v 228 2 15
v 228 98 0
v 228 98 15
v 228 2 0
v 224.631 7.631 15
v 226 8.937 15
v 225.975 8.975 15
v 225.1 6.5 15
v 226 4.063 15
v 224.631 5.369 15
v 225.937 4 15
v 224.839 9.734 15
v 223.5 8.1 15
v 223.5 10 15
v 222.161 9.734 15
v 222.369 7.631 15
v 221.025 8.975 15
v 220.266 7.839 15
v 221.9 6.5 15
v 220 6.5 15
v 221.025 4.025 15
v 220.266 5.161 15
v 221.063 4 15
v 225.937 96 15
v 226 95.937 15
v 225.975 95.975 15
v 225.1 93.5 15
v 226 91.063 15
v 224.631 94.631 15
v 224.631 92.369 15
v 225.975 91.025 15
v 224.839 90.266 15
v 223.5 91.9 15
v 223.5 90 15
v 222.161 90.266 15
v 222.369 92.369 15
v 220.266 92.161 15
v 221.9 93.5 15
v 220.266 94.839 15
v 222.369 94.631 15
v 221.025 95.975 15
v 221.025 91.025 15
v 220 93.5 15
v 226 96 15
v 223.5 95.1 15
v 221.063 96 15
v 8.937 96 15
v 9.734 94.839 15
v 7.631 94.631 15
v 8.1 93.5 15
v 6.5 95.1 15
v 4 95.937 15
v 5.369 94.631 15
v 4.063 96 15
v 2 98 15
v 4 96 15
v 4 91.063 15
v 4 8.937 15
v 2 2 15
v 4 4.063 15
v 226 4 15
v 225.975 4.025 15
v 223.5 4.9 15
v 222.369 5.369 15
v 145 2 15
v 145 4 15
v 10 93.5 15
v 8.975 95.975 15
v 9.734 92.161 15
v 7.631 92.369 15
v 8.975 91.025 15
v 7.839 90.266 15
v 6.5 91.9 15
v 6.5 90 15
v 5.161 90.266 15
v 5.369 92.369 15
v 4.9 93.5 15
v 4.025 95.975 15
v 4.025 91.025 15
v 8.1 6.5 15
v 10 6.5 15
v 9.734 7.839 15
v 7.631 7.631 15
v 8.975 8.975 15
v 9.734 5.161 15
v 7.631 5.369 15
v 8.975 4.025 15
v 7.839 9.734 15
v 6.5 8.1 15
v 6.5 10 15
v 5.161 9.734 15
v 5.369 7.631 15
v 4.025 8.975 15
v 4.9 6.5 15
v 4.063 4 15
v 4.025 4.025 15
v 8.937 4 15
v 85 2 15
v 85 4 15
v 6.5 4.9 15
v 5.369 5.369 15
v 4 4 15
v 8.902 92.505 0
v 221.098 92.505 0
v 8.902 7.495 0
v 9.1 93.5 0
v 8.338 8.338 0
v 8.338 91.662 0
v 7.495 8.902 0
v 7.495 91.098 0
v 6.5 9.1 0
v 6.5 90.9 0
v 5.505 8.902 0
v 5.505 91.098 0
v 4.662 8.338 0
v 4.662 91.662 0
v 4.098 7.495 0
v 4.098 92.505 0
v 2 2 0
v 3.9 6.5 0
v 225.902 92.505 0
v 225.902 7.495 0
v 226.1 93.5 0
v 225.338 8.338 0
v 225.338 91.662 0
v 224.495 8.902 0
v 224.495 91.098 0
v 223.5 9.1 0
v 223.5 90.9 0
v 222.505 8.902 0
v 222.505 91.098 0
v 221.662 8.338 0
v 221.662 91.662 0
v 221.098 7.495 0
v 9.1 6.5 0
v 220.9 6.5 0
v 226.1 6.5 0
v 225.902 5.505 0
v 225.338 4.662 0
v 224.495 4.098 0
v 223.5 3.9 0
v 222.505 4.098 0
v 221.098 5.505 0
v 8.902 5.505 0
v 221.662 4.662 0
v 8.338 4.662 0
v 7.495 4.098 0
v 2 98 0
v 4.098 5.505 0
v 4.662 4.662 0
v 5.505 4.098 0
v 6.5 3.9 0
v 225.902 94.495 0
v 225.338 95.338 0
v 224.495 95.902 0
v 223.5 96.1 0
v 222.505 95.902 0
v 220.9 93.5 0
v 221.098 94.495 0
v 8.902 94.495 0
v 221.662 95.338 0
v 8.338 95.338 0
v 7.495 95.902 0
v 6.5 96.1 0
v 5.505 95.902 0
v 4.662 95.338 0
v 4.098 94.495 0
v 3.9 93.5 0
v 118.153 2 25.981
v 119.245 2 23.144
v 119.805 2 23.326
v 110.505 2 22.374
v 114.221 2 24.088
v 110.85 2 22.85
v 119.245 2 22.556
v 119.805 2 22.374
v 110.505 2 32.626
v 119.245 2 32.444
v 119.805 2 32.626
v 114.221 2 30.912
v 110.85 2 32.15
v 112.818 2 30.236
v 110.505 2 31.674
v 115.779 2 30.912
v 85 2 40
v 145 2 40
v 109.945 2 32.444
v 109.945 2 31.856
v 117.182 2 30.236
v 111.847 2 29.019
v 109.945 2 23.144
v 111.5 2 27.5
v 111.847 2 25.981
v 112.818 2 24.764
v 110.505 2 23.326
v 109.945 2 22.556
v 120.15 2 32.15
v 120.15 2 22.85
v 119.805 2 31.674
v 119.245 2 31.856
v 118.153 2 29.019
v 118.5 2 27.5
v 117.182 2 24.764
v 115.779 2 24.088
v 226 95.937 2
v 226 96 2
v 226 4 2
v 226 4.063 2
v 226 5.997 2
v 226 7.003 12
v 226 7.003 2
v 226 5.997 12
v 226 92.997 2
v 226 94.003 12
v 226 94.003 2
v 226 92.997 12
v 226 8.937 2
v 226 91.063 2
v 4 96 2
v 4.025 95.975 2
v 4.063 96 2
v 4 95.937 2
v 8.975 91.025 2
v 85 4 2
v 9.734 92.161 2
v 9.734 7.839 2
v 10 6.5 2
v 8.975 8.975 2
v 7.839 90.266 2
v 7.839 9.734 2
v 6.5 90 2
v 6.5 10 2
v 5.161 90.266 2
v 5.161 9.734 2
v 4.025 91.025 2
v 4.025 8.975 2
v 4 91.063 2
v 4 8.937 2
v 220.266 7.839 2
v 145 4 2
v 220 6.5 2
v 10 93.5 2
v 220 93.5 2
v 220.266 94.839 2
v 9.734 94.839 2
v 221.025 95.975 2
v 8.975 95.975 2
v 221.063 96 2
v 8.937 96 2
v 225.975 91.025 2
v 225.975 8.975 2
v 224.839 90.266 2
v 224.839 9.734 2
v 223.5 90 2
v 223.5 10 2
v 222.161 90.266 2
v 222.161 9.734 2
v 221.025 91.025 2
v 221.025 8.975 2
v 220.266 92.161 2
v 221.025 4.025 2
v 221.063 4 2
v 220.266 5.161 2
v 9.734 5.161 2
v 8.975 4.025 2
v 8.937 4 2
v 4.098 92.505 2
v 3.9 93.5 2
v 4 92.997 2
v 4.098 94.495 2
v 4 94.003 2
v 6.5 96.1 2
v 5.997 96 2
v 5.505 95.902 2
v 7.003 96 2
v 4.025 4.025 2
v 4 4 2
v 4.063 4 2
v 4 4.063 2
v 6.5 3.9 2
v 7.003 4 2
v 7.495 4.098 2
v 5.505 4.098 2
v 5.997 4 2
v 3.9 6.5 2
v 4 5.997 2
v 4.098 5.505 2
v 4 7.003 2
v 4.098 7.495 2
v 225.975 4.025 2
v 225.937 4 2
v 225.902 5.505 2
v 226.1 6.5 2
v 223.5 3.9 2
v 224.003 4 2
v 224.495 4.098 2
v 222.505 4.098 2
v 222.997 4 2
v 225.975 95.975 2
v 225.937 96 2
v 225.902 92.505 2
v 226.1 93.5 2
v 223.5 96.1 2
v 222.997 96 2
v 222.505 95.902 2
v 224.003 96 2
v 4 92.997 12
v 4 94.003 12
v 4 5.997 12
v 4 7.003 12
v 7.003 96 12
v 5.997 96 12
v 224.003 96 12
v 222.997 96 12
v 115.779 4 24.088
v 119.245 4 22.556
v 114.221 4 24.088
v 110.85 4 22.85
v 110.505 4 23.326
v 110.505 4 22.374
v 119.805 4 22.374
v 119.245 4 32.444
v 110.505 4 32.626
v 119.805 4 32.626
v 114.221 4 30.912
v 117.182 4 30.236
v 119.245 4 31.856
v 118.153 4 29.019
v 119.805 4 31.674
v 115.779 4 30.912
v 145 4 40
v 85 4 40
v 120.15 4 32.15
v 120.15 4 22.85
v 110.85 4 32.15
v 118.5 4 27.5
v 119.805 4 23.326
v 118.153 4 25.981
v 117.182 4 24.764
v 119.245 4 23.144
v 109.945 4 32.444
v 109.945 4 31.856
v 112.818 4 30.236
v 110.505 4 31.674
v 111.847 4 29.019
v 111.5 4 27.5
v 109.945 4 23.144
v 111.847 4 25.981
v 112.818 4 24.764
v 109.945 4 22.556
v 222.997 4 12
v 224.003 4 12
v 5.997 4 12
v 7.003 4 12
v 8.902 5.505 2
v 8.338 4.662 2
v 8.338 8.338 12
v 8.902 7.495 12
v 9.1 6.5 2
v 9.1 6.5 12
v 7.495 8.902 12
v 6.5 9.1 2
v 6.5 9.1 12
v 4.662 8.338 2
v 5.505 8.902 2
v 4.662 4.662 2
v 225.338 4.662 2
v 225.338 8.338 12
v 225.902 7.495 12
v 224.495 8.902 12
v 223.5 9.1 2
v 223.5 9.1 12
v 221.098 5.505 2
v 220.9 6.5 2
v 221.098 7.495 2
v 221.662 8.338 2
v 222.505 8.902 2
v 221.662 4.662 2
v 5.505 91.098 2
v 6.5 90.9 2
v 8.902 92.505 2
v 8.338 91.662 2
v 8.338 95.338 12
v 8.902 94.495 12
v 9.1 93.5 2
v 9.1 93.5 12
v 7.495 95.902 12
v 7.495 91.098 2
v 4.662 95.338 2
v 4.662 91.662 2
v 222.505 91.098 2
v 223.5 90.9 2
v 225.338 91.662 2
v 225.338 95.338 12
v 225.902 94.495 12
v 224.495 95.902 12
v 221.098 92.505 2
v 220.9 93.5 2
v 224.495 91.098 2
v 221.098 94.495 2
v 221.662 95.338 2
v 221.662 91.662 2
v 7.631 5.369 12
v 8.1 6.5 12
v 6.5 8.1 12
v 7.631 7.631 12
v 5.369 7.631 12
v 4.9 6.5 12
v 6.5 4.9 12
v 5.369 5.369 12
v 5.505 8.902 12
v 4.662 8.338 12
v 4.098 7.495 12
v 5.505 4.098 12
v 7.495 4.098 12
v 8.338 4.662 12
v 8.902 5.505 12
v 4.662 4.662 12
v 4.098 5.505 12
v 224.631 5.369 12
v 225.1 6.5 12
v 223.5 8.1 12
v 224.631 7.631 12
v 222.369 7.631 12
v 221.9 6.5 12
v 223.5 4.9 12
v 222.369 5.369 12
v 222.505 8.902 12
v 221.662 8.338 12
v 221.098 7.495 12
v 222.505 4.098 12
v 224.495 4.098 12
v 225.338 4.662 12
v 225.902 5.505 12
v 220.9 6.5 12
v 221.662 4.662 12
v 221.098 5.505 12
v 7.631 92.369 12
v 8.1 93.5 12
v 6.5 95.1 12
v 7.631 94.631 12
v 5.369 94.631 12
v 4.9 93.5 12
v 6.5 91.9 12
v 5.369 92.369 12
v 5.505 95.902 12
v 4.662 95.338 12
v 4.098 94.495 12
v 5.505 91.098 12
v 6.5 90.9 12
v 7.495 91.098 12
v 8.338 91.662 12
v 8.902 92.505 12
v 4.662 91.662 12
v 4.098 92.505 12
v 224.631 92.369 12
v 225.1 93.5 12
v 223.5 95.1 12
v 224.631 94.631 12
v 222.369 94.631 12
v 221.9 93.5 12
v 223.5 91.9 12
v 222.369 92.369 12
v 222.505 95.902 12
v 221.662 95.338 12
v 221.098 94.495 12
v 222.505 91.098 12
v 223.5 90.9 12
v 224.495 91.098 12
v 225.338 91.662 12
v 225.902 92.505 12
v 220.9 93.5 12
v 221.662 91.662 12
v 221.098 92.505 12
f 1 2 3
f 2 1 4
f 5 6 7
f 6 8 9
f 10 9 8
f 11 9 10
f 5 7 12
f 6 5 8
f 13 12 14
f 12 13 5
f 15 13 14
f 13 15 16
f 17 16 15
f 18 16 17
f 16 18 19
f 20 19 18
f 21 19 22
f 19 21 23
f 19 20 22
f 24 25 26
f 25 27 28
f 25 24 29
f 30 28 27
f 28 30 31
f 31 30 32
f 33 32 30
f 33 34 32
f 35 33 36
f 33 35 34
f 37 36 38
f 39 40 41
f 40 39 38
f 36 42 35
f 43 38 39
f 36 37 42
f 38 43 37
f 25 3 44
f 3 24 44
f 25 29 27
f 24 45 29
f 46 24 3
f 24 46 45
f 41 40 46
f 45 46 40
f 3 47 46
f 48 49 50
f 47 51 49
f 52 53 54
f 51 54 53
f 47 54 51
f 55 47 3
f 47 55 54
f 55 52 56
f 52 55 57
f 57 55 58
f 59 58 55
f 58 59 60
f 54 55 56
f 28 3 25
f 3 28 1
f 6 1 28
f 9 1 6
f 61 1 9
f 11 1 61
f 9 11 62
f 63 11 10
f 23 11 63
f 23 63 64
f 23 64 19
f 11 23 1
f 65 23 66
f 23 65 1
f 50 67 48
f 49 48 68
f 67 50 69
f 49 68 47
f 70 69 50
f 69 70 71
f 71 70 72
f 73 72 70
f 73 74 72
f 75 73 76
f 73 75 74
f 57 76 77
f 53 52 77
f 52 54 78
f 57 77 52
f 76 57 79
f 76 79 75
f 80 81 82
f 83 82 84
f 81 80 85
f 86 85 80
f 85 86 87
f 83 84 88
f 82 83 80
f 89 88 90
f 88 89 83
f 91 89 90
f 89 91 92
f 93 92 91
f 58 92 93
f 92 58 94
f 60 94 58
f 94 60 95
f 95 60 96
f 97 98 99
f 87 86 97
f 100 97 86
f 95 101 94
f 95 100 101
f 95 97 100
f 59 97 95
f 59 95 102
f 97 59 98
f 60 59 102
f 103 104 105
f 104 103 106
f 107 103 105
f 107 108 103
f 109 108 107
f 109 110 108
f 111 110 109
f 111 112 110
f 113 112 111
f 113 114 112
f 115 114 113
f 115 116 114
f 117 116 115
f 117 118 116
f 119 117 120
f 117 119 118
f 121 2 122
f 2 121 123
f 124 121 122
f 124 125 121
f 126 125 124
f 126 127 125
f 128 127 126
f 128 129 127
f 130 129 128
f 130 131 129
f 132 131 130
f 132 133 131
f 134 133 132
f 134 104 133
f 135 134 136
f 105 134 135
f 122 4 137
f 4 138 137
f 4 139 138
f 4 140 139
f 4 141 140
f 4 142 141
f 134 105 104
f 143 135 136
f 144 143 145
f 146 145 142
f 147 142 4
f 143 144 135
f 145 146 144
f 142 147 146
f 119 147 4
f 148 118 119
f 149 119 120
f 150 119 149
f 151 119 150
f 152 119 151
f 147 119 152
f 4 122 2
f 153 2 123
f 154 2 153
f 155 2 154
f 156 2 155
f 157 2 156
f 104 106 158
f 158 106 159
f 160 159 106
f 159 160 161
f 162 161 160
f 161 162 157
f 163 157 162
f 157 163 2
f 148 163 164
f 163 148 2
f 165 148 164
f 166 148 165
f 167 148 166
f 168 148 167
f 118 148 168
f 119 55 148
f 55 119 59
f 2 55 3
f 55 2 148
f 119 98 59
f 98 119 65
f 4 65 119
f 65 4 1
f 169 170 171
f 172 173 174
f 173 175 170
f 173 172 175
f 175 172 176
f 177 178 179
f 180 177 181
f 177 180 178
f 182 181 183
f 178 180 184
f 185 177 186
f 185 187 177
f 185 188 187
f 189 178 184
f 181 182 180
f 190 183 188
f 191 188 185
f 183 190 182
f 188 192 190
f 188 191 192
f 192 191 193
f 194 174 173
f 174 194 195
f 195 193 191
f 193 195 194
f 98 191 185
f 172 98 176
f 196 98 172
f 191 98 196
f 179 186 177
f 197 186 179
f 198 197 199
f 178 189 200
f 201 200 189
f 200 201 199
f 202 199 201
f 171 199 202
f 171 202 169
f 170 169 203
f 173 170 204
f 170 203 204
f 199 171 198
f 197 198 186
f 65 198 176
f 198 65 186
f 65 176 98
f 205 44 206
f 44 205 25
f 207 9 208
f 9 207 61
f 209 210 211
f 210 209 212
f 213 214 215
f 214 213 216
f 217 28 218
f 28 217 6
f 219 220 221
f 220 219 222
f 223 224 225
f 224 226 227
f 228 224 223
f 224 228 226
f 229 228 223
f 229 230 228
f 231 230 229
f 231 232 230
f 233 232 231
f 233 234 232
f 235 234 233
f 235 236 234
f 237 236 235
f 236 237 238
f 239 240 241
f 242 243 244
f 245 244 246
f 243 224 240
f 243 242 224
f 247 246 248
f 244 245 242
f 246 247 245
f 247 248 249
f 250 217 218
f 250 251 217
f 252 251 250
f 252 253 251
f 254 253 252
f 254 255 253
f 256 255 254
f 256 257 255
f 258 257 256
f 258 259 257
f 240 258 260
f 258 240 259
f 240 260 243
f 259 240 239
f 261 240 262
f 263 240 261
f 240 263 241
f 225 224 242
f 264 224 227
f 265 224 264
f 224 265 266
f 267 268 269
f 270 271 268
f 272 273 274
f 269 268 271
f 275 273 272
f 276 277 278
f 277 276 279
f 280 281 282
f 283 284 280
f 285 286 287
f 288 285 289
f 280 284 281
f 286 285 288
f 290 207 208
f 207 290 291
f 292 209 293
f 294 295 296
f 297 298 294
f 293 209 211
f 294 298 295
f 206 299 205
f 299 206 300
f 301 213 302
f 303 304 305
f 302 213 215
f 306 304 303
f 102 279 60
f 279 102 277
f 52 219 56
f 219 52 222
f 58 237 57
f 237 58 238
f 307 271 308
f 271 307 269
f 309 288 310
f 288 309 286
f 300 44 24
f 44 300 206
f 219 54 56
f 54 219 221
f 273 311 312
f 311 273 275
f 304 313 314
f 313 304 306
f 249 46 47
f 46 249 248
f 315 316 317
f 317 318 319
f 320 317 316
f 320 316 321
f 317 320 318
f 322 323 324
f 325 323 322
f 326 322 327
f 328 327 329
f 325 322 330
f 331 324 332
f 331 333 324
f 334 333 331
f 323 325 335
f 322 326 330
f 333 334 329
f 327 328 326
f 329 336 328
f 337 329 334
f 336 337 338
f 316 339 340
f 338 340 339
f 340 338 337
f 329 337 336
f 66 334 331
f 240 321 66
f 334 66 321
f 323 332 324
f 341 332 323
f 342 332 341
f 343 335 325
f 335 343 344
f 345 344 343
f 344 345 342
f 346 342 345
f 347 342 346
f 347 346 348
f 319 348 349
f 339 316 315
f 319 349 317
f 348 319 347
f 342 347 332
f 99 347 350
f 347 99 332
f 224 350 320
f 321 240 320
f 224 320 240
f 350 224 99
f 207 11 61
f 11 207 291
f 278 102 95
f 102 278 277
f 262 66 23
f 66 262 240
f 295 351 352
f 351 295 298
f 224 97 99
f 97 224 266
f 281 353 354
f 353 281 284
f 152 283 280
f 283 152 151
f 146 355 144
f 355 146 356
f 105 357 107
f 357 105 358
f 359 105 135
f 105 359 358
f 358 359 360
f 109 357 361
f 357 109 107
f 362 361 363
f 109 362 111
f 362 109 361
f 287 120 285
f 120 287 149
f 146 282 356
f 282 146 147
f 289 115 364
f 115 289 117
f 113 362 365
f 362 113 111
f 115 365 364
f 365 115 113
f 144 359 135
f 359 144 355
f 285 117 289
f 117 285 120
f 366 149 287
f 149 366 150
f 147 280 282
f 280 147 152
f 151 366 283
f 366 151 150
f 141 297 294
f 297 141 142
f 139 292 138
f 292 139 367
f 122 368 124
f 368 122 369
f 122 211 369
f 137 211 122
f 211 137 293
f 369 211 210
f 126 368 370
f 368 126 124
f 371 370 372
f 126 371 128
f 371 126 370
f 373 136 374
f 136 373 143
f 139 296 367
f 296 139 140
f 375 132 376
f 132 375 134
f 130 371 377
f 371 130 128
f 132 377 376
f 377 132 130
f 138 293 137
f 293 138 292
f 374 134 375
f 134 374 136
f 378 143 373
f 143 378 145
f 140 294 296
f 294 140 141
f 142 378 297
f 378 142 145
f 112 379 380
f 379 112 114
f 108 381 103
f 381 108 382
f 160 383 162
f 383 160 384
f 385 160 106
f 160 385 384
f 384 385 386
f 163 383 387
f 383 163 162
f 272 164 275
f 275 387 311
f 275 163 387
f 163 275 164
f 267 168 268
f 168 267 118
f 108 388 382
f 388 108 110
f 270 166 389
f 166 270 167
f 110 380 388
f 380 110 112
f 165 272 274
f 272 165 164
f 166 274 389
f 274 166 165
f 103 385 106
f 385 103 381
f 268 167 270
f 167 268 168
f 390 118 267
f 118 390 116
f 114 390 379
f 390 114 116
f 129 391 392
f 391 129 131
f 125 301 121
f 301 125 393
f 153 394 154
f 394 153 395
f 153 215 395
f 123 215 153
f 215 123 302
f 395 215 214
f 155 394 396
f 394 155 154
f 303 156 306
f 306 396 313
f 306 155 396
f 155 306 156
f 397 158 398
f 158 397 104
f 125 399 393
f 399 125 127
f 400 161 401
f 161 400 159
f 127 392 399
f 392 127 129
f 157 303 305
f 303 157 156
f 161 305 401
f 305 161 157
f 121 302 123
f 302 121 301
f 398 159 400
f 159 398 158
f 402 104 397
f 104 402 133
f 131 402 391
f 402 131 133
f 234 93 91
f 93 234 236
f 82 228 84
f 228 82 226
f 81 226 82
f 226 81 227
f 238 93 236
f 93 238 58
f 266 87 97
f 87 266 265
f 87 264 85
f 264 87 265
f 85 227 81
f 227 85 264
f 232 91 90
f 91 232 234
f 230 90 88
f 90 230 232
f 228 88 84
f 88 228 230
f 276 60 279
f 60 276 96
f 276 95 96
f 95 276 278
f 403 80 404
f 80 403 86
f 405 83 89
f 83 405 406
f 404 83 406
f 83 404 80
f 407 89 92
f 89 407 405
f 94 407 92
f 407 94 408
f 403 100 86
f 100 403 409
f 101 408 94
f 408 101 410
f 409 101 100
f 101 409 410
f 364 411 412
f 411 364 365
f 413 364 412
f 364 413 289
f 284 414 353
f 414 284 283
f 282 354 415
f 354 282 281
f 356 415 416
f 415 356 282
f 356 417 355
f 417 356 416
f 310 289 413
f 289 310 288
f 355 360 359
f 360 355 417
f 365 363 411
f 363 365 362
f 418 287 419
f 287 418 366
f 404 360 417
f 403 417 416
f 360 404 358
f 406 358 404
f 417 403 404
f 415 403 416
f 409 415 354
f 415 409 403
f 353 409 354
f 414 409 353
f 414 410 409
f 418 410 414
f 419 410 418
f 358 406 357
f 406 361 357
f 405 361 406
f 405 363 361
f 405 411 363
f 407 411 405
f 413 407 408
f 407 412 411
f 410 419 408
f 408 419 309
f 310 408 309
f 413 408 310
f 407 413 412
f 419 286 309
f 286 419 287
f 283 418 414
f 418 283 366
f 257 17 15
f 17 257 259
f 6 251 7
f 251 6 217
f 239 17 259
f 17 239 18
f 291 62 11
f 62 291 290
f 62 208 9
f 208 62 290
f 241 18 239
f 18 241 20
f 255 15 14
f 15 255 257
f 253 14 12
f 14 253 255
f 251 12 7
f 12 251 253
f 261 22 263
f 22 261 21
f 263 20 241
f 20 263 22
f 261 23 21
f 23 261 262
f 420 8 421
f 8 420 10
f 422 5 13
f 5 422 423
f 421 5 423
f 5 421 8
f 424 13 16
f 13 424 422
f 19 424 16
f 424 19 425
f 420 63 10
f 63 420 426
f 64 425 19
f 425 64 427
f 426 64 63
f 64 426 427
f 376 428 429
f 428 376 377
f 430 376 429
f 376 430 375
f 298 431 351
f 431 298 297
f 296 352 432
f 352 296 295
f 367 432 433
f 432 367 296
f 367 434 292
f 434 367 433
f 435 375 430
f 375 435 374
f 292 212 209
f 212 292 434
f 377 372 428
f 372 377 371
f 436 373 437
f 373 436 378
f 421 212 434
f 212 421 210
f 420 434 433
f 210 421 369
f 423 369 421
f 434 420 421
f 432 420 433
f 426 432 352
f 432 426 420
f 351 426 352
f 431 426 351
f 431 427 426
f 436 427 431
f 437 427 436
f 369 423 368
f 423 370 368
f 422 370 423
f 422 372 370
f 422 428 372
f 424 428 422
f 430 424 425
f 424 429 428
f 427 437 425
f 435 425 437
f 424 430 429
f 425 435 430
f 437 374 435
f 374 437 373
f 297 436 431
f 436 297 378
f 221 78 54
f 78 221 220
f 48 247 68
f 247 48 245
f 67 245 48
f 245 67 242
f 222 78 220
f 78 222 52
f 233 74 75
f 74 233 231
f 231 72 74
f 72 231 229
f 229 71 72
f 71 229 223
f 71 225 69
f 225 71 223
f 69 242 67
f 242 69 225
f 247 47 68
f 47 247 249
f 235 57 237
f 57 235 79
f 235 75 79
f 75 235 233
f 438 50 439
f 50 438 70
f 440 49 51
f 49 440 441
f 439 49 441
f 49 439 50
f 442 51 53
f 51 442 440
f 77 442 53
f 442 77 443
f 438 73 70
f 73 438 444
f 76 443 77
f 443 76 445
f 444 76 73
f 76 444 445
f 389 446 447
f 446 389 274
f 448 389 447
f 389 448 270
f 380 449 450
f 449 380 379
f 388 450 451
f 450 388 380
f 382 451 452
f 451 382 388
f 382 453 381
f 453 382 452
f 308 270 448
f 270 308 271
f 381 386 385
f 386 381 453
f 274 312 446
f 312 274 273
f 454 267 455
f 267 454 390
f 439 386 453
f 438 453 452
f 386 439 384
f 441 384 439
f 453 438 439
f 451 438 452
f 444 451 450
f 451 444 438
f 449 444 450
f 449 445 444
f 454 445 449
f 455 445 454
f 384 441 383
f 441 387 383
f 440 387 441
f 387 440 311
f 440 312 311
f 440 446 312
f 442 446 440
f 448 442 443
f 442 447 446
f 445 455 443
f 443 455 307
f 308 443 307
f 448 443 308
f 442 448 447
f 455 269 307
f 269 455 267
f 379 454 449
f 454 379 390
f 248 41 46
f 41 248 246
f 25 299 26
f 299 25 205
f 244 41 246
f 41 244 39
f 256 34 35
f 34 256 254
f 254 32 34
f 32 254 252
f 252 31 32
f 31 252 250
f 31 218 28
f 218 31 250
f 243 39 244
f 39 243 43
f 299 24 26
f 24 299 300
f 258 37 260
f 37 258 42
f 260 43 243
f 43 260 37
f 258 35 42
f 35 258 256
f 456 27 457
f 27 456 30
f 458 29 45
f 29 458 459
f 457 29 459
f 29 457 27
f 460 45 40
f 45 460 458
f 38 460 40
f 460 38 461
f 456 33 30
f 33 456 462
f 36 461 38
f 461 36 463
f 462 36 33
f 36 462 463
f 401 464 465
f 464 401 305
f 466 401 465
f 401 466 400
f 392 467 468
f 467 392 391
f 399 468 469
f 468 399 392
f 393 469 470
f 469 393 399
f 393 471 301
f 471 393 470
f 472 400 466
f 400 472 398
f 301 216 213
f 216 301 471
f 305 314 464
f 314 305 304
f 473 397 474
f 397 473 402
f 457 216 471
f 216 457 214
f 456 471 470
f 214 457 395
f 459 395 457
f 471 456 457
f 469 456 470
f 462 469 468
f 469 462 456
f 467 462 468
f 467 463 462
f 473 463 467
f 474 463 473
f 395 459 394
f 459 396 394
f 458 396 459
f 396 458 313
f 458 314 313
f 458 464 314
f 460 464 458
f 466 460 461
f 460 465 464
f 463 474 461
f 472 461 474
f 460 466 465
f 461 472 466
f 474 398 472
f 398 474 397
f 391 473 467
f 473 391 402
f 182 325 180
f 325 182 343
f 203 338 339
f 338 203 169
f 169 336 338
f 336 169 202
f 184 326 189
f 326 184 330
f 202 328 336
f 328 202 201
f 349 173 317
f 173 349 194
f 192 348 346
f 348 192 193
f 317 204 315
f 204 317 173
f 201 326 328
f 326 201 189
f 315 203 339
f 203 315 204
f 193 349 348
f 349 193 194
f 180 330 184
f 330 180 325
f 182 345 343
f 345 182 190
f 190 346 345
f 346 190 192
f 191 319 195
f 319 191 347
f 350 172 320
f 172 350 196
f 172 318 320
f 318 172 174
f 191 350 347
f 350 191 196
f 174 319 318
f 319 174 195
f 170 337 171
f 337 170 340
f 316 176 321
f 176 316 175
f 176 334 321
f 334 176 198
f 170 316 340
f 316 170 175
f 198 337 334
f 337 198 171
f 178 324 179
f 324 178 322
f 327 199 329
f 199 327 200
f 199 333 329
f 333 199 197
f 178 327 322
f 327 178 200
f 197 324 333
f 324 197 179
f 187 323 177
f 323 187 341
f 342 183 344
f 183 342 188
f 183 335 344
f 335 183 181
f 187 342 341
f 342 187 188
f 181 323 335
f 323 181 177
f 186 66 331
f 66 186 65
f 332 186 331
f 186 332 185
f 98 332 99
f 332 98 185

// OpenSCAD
case_width = 230;
case_depth = 100;
bottom_rim = 15;
wall_thickness=2;
screw_head_diameter=5;
screw_diameter=3;

module screw_cylinder_bot(pos){
    translate(pos)
    difference(){
        cylinder(h=bottom_rim-wall_thickness, r=screw_head_diameter/2+1, $fn=16);
        cylinder(h=bottom_rim-wall_thickness, r=screw_diameter/2+0.1, $fn=8);
        cylinder(h=bottom_rim-wall_thickness-3,r=screw_head_diameter/2+0.1, $fn=16);
    }
}

module screw_hole_bot(pos){
    translate(pos)
        cylinder(h=wall_thickness, r=screw_head_diameter/2+0.1, $fn=16);
}

module vol_knob_support(x, z){
    translate([4.65 * x, 0, 4.65 * z])
        rotate([-90, 0, 0])
            cylinder(r=0.5,h=wall_thickness);
}
    

translate([wall_thickness, wall_thickness, 0])
    difference(){
        
        cube([case_width-wall_thickness*2, case_depth-wall_thickness*2, bottom_rim]);
        
        translate([wall_thickness, wall_thickness, wall_thickness])
            cube([case_width-wall_thickness*4, case_depth-wall_thickness*4,bottom_rim]);
        
        // Bottom holes for screw heads
        // Front left
        screw_hole_bot([wall_thickness + screw_head_diameter/2 , wall_thickness + screw_head_diameter/2 , 0]);
        
        // Front right
        screw_hole_bot([case_width - wall_thickness*3 - screw_head_diameter/2, wall_thickness + screw_head_diameter/2, 0]);
        
        // Rear left
        screw_hole_bot([wall_thickness + screw_head_diameter/2, case_depth - wall_thickness*3 - screw_head_diameter/2, 0]);
        
        // Rear right
        screw_hole_bot([case_width - wall_thickness*3 - screw_head_diameter/2,case_depth - wall_thickness*3 - screw_head_diameter/2, 0]);
    }
    
    // Screw posts
    // Front left
    screw_cylinder_bot([wall_thickness*2 + screw_head_diameter/2, wall_thickness*2 + screw_head_diameter/2,wall_thickness]);
    
    // Front right
    screw_cylinder_bot([case_width-wall_thickness*2-screw_head_diameter/2, wall_thickness*2 + screw_head_diameter/2, wall_thickness]);
    
    // Rear left
    screw_cylinder_bot([wall_thickness*2 + screw_head_diameter/2, case_depth - wall_thickness*2 - screw_head_diameter/2, wall_thickness]);
    
    // Rear right
    screw_cylinder_bot([case_width-wall_thickness*2-screw_head_diameter/2, case_depth - wall_thickness*2 - screw_head_diameter/2, wall_thickness]);
    
    vol_support_x = 60;
    vol_support_z = 25;
    translate([case_width/2-vol_support_x/2, wall_thickness, 0])
    difference(){
        cube([vol_support_x, wall_thickness, vol_support_z+bottom_rim]);
        translate([vol_support_x/2, 0, bottom_rim + vol_support_z/2]){
            rotate([-90, 0, 0])
                cylinder(r=3.5, h=wall_thickness, $fn=14);
            
            vol_knob_support(-1, -1);
            vol_knob_support(1, -1);
            vol_knob_support(1, 1);
            vol_knob_support(-1, 1);
        }
            
        
            
    }
    
    
